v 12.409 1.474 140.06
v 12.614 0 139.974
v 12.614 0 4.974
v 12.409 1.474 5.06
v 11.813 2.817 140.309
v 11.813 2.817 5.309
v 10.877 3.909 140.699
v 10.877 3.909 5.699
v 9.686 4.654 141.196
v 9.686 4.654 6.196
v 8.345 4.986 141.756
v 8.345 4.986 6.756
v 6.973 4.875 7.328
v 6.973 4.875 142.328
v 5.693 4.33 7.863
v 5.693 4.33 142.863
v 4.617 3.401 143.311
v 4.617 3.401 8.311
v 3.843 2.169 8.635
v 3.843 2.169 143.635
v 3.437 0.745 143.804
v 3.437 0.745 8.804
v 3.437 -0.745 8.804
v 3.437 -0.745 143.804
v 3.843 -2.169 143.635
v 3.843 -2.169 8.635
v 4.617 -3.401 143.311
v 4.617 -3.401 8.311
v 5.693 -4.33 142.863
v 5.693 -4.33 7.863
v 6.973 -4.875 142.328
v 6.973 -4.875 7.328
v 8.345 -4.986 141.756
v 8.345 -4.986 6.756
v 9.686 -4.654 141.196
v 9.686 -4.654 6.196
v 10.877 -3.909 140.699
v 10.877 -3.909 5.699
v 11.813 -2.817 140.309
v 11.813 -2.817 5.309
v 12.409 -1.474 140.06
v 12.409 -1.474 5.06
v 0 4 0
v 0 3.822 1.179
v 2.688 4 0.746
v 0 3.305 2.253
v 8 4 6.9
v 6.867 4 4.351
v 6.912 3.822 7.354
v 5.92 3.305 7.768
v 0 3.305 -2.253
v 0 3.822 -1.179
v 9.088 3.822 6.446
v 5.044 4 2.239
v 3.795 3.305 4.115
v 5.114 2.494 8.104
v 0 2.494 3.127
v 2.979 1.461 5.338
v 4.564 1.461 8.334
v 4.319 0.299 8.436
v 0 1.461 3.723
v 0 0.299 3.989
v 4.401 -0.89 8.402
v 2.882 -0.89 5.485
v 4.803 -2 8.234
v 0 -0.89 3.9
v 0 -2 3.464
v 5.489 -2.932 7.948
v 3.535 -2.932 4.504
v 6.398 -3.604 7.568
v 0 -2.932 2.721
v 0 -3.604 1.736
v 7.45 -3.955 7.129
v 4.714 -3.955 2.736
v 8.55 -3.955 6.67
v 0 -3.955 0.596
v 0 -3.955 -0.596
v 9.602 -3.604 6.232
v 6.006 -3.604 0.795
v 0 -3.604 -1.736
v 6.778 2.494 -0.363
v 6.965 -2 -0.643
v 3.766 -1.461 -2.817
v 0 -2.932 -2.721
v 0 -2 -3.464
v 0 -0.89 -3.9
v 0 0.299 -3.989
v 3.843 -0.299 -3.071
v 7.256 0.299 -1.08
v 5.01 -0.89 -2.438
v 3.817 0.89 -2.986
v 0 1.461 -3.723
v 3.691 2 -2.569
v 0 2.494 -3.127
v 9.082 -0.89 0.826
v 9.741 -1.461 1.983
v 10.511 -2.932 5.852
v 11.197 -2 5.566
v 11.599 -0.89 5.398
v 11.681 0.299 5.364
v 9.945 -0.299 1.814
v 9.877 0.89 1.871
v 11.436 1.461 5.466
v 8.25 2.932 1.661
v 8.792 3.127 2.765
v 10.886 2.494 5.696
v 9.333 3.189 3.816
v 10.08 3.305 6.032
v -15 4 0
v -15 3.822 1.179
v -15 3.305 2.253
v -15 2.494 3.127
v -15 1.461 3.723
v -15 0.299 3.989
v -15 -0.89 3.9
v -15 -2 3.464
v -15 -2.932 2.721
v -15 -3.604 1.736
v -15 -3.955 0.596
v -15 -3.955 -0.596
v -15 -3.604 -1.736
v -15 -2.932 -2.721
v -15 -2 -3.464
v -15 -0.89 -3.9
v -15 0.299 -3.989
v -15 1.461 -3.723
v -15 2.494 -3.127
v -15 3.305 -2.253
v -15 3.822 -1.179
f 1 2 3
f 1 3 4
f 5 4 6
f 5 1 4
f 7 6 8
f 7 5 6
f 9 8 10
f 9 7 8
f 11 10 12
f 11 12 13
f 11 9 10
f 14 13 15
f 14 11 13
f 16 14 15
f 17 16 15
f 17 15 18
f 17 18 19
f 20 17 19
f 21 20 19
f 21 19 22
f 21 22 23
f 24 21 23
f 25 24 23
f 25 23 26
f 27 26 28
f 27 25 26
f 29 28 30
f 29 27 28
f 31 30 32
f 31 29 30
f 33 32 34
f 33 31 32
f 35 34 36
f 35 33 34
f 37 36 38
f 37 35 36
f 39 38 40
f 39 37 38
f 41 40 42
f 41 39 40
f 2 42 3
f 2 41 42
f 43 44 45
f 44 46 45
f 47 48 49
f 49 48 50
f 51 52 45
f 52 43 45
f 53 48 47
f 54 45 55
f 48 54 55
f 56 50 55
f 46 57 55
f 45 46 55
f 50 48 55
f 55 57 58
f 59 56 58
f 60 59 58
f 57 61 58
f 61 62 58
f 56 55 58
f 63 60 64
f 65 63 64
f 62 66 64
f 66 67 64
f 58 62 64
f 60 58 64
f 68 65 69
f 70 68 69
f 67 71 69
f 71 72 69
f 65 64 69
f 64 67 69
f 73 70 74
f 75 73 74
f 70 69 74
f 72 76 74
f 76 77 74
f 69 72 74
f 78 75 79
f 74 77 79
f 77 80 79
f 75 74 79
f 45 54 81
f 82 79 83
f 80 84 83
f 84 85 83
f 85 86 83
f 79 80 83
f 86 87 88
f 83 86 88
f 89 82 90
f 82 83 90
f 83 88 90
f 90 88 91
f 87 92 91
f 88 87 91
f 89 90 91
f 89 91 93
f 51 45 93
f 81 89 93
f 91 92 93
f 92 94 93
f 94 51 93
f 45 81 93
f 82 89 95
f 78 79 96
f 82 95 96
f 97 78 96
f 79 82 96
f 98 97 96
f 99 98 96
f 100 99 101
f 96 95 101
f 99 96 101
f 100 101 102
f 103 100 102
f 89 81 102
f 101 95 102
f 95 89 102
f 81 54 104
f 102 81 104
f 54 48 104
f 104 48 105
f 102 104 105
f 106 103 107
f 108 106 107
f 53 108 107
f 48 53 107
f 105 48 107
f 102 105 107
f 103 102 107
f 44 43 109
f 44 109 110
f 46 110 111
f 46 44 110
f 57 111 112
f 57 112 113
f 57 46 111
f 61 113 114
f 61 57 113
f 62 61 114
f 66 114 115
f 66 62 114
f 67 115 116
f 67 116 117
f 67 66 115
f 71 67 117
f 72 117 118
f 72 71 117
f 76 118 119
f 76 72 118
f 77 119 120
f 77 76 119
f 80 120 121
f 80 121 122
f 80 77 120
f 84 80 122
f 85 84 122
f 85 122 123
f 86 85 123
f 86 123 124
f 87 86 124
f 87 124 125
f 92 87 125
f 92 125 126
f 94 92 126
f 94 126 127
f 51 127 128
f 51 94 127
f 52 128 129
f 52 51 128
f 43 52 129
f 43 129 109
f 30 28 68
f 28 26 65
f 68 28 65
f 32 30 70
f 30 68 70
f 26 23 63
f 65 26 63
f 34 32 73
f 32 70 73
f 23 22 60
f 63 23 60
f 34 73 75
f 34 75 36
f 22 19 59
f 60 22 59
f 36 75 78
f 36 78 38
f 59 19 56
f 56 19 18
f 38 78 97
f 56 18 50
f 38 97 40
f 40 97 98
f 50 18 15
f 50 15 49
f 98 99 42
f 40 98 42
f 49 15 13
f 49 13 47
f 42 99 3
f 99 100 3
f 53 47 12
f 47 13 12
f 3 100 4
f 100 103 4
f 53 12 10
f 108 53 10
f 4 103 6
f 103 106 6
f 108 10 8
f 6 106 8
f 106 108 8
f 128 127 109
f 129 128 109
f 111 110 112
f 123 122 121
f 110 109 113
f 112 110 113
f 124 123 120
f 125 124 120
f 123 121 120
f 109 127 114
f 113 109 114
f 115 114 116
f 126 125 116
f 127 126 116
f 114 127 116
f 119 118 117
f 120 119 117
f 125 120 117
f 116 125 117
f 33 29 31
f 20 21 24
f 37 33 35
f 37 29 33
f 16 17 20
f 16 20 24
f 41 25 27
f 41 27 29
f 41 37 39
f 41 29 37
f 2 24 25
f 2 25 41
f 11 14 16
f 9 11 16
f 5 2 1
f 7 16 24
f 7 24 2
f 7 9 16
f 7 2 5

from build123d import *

# Parameters (mm, degrees)
F0_R     = 4
F3_R     = 5
F3_R_2   = 4
F7_DEPTH = 15


with BuildPart() as f2:
    # F2: sweep along a path in F1
    with BuildLine(Plane.XZ) as f2_path:
        ThreePointArc((0, 0), (5.0440752924, 2.2394060053), (8, 6.8998935265))
    # F0 (on Right) → F2 (sweep)
    with BuildSketch(Plane.YZ):
        Circle(F0_R)
    sweep(path=f2_path.line)

    # F6: sweep along a path in F5
    with BuildLine(Plane.XZ) as f6_path:
        Line((8, 6.8998935265), (8, 141.8998935265))
    # F3 (on face) → F6 (sweep)
    with BuildSketch(Plane(origin=(3.6385222305, 0, 8.719810755), x_dir=(0.9228788637, 0, -0.3850903828), z_dir=(0.3850903828, 0, 0.9228788637))):
        with Locations((4.7259482702, 0)):
            Circle(F3_R)
        with Locations((4.7259482702, 0)):
            Circle(F3_R_2, mode=Mode.SUBTRACT)
        with Locations((4.7259482702, 0)):
            Circle(F3_R_2)
    sweep(path=f6_path.line)

    # F7 (add): a face of the model
    f7_faces = [f2.faces().sort_by_distance(p)[0] for p in [
        (0, 0, 0),
    ]]
    extrude(f7_faces, amount=F7_DEPTH)


solid = f2.part
